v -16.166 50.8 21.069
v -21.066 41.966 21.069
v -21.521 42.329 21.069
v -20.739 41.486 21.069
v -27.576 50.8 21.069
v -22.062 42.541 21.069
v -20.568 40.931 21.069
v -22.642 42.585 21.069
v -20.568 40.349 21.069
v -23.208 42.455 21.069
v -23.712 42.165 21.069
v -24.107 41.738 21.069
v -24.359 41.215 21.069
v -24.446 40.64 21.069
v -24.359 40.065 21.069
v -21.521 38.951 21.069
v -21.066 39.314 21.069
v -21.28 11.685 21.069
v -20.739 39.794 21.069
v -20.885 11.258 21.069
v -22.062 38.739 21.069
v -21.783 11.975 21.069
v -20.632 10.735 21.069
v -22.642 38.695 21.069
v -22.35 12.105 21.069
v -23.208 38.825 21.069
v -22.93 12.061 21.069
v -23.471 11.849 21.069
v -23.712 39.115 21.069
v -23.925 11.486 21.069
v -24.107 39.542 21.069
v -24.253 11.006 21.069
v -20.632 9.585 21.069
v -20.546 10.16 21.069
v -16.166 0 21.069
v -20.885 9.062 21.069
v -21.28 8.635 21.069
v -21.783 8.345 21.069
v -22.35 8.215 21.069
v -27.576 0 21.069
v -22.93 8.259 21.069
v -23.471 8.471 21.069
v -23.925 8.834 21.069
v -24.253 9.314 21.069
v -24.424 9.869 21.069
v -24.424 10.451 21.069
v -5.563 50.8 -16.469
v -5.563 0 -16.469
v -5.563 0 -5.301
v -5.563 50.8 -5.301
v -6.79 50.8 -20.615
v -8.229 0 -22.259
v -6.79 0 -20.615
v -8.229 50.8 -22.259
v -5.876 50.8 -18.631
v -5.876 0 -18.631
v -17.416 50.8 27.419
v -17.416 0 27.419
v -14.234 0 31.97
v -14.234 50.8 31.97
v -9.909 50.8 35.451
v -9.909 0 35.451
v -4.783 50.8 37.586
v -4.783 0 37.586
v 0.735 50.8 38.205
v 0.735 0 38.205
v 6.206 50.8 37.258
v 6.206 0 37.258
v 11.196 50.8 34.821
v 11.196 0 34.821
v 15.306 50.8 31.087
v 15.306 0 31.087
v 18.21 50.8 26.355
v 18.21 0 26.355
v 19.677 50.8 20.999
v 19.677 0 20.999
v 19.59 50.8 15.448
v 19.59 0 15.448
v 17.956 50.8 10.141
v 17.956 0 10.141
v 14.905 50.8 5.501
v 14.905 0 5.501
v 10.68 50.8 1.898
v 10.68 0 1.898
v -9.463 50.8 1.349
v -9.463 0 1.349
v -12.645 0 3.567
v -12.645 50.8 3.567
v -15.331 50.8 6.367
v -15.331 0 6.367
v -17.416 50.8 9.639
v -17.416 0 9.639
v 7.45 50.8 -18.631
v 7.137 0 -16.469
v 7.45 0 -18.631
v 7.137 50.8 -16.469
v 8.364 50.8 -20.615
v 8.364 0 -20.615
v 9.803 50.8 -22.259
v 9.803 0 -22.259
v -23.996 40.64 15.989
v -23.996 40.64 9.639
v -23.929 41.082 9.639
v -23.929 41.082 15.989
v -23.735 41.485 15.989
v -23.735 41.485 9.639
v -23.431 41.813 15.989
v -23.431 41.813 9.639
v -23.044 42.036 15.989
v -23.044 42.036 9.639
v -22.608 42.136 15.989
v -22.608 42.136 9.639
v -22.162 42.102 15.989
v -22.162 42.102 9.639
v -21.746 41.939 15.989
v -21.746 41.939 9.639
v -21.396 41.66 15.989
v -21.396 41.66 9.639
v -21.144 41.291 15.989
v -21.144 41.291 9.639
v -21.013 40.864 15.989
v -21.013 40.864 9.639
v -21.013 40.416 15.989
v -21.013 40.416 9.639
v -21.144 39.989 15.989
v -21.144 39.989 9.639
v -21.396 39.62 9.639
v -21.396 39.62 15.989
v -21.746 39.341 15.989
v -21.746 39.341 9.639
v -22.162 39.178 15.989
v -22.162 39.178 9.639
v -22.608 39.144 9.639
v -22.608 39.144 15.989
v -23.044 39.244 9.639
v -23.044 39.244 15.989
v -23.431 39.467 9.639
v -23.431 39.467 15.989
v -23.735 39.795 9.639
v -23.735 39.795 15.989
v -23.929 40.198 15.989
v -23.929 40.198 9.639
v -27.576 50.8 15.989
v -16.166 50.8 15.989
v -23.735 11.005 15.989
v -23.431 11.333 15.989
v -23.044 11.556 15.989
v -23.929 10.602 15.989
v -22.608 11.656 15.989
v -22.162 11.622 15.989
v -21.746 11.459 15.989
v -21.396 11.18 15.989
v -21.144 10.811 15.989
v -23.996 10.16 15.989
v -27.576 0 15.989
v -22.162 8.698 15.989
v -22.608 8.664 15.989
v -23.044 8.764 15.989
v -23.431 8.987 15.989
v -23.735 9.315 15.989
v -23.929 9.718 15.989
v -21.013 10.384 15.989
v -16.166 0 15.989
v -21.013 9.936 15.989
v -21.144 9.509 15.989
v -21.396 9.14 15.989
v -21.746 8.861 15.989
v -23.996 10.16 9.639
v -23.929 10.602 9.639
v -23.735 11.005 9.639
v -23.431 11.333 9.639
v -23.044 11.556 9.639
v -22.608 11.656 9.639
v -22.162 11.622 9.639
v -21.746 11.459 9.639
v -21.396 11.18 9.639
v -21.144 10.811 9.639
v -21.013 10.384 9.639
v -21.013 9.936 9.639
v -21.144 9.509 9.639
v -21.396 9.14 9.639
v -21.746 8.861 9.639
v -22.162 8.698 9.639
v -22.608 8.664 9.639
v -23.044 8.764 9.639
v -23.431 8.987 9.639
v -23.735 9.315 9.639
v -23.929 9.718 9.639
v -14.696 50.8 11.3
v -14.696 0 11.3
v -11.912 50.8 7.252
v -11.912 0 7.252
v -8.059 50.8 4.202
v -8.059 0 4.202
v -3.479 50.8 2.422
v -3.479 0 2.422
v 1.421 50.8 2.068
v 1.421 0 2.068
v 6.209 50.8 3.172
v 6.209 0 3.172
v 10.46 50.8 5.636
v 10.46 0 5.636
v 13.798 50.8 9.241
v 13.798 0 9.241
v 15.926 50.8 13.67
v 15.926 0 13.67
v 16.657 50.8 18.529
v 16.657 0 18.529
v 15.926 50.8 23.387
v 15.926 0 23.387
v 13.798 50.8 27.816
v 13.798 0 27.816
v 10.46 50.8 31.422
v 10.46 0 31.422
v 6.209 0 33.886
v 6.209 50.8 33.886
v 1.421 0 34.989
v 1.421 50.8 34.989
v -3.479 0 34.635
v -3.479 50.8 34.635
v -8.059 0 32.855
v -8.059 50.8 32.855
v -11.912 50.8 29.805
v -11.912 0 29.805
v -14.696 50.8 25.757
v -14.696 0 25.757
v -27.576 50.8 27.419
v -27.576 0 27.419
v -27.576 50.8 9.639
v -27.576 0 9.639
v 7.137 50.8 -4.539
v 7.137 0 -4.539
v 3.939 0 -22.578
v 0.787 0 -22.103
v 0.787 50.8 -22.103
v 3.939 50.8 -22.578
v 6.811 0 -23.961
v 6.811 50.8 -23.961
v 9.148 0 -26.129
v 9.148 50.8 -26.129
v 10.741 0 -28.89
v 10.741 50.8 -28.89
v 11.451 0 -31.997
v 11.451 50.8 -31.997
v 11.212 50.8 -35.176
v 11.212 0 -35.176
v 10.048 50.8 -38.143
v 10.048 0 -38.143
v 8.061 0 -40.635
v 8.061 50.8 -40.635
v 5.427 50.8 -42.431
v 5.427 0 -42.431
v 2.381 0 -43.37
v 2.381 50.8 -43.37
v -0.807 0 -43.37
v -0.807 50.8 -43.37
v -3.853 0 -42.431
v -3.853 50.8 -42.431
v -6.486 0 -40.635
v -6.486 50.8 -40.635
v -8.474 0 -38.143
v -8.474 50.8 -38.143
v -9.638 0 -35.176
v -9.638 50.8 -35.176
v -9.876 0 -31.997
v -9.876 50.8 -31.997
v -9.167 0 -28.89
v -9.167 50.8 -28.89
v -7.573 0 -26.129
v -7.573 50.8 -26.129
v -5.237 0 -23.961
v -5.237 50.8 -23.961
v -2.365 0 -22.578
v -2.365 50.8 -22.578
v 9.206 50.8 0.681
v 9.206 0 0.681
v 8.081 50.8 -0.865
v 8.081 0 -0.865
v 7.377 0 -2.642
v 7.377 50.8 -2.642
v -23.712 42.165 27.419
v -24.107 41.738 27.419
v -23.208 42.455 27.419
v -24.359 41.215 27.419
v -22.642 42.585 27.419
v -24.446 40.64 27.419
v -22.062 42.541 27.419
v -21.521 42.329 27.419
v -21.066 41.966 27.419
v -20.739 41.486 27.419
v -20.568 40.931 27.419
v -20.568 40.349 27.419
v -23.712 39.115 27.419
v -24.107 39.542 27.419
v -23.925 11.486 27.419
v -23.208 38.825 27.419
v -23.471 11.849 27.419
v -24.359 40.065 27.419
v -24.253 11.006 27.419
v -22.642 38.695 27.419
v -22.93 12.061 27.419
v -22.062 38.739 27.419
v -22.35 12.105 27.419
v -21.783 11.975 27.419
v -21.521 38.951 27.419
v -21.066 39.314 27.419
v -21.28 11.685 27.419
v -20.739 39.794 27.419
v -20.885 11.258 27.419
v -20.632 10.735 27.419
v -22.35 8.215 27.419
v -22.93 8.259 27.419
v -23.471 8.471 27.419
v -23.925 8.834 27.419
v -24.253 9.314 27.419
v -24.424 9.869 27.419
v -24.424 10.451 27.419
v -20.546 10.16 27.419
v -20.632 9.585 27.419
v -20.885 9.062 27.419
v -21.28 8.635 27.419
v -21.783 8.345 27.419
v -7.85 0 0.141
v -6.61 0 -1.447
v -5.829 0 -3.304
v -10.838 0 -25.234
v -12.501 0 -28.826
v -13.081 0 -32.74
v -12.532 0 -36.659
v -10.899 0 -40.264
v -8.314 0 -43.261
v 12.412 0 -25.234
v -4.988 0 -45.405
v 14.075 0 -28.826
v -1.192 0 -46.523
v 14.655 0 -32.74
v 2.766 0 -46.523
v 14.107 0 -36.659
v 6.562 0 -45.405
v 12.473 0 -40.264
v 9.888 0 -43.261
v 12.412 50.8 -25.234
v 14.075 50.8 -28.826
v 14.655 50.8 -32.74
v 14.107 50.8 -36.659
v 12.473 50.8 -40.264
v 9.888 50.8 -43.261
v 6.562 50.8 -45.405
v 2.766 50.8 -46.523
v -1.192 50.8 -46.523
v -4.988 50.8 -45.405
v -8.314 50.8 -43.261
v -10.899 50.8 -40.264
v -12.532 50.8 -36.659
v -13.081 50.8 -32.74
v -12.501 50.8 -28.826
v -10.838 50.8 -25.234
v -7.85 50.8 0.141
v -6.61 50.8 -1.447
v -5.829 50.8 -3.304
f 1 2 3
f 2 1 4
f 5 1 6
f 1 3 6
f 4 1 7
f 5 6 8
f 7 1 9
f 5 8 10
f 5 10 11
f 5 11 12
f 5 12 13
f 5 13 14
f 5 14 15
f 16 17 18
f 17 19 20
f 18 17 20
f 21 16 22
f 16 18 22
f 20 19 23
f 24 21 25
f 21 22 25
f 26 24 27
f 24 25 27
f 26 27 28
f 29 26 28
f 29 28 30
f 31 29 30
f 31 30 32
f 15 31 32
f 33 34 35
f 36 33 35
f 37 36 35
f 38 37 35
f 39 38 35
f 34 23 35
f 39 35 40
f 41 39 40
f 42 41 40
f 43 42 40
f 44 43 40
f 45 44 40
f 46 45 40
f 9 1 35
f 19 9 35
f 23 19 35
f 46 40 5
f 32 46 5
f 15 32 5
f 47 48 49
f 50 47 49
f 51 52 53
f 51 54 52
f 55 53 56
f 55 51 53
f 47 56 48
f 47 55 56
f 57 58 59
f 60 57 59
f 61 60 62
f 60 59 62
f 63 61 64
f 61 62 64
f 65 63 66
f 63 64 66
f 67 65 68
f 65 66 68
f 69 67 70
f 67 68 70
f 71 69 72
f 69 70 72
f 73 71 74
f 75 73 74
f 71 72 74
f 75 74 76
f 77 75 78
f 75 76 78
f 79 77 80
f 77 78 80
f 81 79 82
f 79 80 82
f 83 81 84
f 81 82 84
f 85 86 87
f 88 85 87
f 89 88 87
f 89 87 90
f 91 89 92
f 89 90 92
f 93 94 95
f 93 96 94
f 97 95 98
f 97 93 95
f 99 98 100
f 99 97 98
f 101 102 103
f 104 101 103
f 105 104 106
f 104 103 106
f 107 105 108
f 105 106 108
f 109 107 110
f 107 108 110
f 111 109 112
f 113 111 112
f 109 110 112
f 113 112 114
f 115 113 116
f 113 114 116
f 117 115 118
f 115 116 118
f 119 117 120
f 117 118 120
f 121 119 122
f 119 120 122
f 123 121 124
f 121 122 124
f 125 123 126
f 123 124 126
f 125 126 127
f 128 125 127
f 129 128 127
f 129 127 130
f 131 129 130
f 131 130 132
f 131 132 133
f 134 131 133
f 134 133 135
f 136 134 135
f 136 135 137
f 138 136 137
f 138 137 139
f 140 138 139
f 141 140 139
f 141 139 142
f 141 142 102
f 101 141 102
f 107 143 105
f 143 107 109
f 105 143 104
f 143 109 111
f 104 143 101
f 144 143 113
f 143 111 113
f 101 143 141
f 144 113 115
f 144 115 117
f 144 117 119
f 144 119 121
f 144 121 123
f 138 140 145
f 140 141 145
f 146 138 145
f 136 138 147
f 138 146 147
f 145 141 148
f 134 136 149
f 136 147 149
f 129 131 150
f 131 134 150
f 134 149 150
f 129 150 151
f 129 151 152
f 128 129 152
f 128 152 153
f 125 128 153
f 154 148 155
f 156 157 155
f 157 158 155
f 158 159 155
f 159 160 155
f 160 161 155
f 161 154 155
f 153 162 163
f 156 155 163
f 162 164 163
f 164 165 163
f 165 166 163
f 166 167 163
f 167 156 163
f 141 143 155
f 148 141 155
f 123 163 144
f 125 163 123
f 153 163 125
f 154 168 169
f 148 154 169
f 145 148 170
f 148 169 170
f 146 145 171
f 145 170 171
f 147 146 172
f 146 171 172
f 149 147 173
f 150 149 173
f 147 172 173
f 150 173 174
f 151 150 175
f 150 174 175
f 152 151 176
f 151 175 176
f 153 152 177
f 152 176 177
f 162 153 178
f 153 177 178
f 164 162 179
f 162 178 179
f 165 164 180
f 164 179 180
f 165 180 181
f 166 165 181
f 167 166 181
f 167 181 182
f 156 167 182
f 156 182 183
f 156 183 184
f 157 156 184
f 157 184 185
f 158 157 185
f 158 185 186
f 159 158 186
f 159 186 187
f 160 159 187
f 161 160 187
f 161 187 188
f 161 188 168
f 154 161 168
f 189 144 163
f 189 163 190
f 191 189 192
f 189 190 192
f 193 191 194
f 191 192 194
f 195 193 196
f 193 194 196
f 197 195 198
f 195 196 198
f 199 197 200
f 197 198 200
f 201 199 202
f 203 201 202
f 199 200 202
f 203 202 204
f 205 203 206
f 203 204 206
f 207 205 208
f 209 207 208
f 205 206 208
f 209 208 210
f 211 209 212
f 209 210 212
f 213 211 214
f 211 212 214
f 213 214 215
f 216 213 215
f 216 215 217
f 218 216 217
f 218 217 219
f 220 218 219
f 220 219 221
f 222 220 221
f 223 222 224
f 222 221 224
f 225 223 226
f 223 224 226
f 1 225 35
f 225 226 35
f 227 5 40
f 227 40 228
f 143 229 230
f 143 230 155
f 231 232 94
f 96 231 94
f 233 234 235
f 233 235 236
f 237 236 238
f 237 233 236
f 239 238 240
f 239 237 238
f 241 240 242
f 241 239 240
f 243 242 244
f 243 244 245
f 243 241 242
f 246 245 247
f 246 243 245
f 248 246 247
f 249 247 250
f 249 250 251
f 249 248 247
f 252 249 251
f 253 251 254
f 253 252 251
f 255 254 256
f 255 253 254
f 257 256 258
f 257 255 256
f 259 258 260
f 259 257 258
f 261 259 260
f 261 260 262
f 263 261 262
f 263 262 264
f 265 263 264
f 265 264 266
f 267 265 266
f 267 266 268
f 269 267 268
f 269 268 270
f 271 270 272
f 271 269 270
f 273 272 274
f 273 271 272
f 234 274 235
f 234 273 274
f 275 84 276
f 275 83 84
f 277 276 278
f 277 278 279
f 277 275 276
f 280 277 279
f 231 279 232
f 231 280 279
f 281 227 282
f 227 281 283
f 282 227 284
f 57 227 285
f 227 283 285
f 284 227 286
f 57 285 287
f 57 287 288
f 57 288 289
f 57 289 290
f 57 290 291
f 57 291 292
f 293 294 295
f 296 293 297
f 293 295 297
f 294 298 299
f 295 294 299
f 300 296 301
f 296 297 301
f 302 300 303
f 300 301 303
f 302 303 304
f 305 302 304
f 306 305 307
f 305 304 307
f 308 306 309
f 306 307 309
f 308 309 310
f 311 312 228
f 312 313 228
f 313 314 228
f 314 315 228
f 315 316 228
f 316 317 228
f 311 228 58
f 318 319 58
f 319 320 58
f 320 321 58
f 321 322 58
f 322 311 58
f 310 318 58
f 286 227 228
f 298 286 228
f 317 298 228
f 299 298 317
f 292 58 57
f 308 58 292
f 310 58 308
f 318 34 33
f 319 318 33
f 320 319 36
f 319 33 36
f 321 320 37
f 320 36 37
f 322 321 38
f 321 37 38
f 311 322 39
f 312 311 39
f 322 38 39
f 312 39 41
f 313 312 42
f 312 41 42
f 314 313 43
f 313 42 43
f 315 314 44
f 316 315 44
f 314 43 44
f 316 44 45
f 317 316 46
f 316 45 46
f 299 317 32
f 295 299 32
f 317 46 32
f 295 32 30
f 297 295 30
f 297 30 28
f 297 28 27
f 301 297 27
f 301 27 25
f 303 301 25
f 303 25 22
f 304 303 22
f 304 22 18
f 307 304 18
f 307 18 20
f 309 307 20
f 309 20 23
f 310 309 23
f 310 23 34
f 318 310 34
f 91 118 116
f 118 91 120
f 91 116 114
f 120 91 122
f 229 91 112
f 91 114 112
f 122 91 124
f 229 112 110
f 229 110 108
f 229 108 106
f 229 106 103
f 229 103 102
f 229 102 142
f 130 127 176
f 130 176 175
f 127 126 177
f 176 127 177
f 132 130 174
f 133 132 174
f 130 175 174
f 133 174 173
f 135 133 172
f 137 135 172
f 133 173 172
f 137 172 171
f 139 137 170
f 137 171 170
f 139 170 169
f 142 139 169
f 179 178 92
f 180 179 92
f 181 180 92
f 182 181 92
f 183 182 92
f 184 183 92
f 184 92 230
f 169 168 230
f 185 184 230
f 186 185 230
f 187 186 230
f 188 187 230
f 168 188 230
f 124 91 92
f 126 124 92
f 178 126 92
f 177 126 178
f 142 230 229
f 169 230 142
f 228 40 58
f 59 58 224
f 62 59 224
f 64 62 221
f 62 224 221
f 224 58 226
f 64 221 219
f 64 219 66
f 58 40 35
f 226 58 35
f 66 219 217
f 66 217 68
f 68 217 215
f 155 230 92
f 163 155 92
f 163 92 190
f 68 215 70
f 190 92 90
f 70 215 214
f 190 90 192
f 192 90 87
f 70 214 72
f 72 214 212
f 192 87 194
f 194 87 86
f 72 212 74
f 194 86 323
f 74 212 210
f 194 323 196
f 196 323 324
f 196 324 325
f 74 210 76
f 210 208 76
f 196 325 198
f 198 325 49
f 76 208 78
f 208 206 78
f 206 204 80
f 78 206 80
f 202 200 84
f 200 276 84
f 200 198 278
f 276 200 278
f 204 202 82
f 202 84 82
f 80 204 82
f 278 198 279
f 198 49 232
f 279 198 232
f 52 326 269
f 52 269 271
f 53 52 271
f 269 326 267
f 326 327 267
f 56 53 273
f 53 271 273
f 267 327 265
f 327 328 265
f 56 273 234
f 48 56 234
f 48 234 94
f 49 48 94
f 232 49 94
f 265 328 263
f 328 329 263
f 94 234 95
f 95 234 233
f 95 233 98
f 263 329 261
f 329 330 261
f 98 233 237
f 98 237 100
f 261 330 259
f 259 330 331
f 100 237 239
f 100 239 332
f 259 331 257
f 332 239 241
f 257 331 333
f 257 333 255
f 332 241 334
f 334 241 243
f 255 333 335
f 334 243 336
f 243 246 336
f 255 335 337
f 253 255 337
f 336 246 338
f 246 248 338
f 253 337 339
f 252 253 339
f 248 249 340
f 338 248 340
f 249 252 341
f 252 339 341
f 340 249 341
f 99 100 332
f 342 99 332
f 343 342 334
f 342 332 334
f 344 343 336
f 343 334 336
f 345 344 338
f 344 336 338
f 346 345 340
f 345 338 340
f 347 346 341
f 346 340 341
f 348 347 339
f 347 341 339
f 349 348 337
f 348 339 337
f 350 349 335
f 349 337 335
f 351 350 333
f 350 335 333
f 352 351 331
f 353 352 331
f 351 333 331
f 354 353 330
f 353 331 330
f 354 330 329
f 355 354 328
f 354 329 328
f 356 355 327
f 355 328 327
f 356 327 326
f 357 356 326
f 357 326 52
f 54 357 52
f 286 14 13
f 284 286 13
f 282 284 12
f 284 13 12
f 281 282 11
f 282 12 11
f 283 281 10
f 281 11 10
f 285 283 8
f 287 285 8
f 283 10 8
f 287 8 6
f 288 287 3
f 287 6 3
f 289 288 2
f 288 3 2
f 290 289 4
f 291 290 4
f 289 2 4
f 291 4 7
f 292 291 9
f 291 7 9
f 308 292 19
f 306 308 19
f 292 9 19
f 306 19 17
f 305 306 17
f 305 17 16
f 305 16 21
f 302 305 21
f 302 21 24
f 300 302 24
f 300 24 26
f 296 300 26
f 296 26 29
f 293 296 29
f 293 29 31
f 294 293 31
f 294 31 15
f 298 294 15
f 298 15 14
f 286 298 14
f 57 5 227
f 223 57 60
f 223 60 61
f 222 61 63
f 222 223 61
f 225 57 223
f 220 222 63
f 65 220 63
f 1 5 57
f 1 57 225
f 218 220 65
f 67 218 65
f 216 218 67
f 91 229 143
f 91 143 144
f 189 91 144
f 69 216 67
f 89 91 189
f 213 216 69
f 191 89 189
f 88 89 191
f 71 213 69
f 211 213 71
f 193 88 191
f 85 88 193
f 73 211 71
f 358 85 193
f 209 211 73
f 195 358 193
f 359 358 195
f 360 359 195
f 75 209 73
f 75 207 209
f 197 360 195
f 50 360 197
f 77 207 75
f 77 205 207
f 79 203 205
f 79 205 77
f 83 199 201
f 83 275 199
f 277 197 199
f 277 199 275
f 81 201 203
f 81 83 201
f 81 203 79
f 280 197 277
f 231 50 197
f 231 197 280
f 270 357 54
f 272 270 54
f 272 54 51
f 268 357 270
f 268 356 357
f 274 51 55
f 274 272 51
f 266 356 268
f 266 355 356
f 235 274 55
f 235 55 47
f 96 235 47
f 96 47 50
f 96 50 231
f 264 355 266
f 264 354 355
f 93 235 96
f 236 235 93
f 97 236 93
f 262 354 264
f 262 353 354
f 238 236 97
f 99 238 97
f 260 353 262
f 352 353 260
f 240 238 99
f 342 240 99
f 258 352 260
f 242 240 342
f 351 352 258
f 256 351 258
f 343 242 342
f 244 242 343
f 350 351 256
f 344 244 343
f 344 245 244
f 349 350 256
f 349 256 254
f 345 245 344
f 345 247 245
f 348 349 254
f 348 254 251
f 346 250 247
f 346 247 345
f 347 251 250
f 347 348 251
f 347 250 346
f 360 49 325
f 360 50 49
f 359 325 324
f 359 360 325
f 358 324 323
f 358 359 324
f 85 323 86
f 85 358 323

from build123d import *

# Parameters (mm, degrees)
SKETCH1_R           = 10.6934
BOSS_EXTRUDE1_DEPTH = 50.8
FILLET1_R           = 7.62
SKETCH2_R           = 1.95
CUT_EXTRUDE1_DEPTH  = 90.044185298
CUT_EXTRUDE3_REACH  = 82.692
SKETCH3_R           = 1.5


with BuildPart() as part:
    # Sketch1 → Boss-Extrude1 (new body)
    with BuildSketch(Plane(origin=(0, 0, 0), x_dir=(1, 0, 0), z_dir=(0, 1, 0))):
        with BuildLine():
            Line((-27.575797838, -21.068578528), (-27.575797838, -27.418578528))
            Line((-27.575797838, -27.418578528), (-17.415797838, -27.418578528))
            ThreePointArc((-17.415797838, -27.418578528), (14.781852954, -31.694178295), (7.137192233, -0.126336551))
            Line((7.137192233, -0.126336551), (7.137192233, 20.467104736))
            ThreePointArc((7.137192233, 20.467104736), (0.787192233, 46.664739041), (-5.562807767, 20.467104736))
            Line((-5.562807767, 20.467104736), (-5.562807767, 0.310008465))
            ThreePointArc((-5.562807767, 0.310008465), (-12.507890511, -3.450714702), (-17.415797838, -9.638578528))
            Line((-17.415797838, -9.638578528), (-27.575797838, -9.638578528))
            Line((-27.575797838, -9.638578528), (-27.575797838, -15.988578528))
            Line((-27.575797838, -15.988578528), (-16.166011022, -15.988578528))
            ThreePointArc((-16.166011022, -15.988578528), (16.657434353, -18.528578528), (-16.166011022, -21.068578528))
            Line((-16.166011022, -21.068578528), (-27.575797838, -21.068578528))
        make_face()
        with Locations(Location((0.787192233, 32.796339041, 0), (0, 0, 270))):
            Circle(SKETCH1_R, mode=Mode.SUBTRACT)
    extrude(amount=BOSS_EXTRUDE1_DEPTH)

    # Fillet1
    fillet1_edges = [part.edges().sort_by_distance(p)[0] for p in [
        (-5.562807767, 25.4, -0.310008465),
        (7.137192233, 25.4, 0.126336551),
        (-5.562807767, 25.4, -20.467104736),
        (7.137192233, 25.4, -20.467104736),
    ]]
    fillet(fillet1_edges, radius=FILLET1_R)

    # Sketch2 → Cut-Extrude1 (cut, through all)
    with BuildSketch(Plane(origin=(0, 0, 21.068578528), x_dir=(-1, 0, 0), z_dir=(0, 0, -1))):
        with Locations((22.495797838, 40.64)):
            Circle(SKETCH2_R)
        with Locations(Location((22.495797838, 10.16, 0), (0, 0, 180))):
            Circle(SKETCH2_R)
    extrude(amount=-CUT_EXTRUDE1_DEPTH, mode=Mode.SUBTRACT)

    # Sketch3 → Cut-Extrude3 (cut, up to next)
    with BuildSketch(Plane(origin=(0, 0, 9.638578528), x_dir=(-1, 0, 0), z_dir=(0, 0, -1)), mode=Mode.PRIVATE) as cut_extrude3_sk1:
        with Locations((22.495797838, 10.16)):
            Circle(SKETCH3_R)
    cut_extrude3_tool1 = extrude(cut_extrude3_sk1.sketch, amount=-CUT_EXTRUDE3_REACH, mode=Mode.PRIVATE) & part.part
    # Sketch3 → Cut-Extrude3 (cut, up to next)
    with BuildSketch(Plane(origin=(0, 0, 9.638578528), x_dir=(-1, 0, 0), z_dir=(0, 0, -1)), mode=Mode.PRIVATE) as cut_extrude3_sk2:
        with Locations((22.495797838, 40.64)):
            Circle(SKETCH3_R)
    cut_extrude3_tool2 = extrude(cut_extrude3_sk2.sketch, amount=-CUT_EXTRUDE3_REACH, mode=Mode.PRIVATE) & part.part
    add(cut_extrude3_tool1.solids().sort_by_distance((-22.495798, 10.16, 9.638579))[0], mode=Mode.SUBTRACT)
    add(cut_extrude3_tool2.solids().sort_by_distance((-22.495798, 40.64, 9.638579))[0], mode=Mode.SUBTRACT)


solid = part.part
